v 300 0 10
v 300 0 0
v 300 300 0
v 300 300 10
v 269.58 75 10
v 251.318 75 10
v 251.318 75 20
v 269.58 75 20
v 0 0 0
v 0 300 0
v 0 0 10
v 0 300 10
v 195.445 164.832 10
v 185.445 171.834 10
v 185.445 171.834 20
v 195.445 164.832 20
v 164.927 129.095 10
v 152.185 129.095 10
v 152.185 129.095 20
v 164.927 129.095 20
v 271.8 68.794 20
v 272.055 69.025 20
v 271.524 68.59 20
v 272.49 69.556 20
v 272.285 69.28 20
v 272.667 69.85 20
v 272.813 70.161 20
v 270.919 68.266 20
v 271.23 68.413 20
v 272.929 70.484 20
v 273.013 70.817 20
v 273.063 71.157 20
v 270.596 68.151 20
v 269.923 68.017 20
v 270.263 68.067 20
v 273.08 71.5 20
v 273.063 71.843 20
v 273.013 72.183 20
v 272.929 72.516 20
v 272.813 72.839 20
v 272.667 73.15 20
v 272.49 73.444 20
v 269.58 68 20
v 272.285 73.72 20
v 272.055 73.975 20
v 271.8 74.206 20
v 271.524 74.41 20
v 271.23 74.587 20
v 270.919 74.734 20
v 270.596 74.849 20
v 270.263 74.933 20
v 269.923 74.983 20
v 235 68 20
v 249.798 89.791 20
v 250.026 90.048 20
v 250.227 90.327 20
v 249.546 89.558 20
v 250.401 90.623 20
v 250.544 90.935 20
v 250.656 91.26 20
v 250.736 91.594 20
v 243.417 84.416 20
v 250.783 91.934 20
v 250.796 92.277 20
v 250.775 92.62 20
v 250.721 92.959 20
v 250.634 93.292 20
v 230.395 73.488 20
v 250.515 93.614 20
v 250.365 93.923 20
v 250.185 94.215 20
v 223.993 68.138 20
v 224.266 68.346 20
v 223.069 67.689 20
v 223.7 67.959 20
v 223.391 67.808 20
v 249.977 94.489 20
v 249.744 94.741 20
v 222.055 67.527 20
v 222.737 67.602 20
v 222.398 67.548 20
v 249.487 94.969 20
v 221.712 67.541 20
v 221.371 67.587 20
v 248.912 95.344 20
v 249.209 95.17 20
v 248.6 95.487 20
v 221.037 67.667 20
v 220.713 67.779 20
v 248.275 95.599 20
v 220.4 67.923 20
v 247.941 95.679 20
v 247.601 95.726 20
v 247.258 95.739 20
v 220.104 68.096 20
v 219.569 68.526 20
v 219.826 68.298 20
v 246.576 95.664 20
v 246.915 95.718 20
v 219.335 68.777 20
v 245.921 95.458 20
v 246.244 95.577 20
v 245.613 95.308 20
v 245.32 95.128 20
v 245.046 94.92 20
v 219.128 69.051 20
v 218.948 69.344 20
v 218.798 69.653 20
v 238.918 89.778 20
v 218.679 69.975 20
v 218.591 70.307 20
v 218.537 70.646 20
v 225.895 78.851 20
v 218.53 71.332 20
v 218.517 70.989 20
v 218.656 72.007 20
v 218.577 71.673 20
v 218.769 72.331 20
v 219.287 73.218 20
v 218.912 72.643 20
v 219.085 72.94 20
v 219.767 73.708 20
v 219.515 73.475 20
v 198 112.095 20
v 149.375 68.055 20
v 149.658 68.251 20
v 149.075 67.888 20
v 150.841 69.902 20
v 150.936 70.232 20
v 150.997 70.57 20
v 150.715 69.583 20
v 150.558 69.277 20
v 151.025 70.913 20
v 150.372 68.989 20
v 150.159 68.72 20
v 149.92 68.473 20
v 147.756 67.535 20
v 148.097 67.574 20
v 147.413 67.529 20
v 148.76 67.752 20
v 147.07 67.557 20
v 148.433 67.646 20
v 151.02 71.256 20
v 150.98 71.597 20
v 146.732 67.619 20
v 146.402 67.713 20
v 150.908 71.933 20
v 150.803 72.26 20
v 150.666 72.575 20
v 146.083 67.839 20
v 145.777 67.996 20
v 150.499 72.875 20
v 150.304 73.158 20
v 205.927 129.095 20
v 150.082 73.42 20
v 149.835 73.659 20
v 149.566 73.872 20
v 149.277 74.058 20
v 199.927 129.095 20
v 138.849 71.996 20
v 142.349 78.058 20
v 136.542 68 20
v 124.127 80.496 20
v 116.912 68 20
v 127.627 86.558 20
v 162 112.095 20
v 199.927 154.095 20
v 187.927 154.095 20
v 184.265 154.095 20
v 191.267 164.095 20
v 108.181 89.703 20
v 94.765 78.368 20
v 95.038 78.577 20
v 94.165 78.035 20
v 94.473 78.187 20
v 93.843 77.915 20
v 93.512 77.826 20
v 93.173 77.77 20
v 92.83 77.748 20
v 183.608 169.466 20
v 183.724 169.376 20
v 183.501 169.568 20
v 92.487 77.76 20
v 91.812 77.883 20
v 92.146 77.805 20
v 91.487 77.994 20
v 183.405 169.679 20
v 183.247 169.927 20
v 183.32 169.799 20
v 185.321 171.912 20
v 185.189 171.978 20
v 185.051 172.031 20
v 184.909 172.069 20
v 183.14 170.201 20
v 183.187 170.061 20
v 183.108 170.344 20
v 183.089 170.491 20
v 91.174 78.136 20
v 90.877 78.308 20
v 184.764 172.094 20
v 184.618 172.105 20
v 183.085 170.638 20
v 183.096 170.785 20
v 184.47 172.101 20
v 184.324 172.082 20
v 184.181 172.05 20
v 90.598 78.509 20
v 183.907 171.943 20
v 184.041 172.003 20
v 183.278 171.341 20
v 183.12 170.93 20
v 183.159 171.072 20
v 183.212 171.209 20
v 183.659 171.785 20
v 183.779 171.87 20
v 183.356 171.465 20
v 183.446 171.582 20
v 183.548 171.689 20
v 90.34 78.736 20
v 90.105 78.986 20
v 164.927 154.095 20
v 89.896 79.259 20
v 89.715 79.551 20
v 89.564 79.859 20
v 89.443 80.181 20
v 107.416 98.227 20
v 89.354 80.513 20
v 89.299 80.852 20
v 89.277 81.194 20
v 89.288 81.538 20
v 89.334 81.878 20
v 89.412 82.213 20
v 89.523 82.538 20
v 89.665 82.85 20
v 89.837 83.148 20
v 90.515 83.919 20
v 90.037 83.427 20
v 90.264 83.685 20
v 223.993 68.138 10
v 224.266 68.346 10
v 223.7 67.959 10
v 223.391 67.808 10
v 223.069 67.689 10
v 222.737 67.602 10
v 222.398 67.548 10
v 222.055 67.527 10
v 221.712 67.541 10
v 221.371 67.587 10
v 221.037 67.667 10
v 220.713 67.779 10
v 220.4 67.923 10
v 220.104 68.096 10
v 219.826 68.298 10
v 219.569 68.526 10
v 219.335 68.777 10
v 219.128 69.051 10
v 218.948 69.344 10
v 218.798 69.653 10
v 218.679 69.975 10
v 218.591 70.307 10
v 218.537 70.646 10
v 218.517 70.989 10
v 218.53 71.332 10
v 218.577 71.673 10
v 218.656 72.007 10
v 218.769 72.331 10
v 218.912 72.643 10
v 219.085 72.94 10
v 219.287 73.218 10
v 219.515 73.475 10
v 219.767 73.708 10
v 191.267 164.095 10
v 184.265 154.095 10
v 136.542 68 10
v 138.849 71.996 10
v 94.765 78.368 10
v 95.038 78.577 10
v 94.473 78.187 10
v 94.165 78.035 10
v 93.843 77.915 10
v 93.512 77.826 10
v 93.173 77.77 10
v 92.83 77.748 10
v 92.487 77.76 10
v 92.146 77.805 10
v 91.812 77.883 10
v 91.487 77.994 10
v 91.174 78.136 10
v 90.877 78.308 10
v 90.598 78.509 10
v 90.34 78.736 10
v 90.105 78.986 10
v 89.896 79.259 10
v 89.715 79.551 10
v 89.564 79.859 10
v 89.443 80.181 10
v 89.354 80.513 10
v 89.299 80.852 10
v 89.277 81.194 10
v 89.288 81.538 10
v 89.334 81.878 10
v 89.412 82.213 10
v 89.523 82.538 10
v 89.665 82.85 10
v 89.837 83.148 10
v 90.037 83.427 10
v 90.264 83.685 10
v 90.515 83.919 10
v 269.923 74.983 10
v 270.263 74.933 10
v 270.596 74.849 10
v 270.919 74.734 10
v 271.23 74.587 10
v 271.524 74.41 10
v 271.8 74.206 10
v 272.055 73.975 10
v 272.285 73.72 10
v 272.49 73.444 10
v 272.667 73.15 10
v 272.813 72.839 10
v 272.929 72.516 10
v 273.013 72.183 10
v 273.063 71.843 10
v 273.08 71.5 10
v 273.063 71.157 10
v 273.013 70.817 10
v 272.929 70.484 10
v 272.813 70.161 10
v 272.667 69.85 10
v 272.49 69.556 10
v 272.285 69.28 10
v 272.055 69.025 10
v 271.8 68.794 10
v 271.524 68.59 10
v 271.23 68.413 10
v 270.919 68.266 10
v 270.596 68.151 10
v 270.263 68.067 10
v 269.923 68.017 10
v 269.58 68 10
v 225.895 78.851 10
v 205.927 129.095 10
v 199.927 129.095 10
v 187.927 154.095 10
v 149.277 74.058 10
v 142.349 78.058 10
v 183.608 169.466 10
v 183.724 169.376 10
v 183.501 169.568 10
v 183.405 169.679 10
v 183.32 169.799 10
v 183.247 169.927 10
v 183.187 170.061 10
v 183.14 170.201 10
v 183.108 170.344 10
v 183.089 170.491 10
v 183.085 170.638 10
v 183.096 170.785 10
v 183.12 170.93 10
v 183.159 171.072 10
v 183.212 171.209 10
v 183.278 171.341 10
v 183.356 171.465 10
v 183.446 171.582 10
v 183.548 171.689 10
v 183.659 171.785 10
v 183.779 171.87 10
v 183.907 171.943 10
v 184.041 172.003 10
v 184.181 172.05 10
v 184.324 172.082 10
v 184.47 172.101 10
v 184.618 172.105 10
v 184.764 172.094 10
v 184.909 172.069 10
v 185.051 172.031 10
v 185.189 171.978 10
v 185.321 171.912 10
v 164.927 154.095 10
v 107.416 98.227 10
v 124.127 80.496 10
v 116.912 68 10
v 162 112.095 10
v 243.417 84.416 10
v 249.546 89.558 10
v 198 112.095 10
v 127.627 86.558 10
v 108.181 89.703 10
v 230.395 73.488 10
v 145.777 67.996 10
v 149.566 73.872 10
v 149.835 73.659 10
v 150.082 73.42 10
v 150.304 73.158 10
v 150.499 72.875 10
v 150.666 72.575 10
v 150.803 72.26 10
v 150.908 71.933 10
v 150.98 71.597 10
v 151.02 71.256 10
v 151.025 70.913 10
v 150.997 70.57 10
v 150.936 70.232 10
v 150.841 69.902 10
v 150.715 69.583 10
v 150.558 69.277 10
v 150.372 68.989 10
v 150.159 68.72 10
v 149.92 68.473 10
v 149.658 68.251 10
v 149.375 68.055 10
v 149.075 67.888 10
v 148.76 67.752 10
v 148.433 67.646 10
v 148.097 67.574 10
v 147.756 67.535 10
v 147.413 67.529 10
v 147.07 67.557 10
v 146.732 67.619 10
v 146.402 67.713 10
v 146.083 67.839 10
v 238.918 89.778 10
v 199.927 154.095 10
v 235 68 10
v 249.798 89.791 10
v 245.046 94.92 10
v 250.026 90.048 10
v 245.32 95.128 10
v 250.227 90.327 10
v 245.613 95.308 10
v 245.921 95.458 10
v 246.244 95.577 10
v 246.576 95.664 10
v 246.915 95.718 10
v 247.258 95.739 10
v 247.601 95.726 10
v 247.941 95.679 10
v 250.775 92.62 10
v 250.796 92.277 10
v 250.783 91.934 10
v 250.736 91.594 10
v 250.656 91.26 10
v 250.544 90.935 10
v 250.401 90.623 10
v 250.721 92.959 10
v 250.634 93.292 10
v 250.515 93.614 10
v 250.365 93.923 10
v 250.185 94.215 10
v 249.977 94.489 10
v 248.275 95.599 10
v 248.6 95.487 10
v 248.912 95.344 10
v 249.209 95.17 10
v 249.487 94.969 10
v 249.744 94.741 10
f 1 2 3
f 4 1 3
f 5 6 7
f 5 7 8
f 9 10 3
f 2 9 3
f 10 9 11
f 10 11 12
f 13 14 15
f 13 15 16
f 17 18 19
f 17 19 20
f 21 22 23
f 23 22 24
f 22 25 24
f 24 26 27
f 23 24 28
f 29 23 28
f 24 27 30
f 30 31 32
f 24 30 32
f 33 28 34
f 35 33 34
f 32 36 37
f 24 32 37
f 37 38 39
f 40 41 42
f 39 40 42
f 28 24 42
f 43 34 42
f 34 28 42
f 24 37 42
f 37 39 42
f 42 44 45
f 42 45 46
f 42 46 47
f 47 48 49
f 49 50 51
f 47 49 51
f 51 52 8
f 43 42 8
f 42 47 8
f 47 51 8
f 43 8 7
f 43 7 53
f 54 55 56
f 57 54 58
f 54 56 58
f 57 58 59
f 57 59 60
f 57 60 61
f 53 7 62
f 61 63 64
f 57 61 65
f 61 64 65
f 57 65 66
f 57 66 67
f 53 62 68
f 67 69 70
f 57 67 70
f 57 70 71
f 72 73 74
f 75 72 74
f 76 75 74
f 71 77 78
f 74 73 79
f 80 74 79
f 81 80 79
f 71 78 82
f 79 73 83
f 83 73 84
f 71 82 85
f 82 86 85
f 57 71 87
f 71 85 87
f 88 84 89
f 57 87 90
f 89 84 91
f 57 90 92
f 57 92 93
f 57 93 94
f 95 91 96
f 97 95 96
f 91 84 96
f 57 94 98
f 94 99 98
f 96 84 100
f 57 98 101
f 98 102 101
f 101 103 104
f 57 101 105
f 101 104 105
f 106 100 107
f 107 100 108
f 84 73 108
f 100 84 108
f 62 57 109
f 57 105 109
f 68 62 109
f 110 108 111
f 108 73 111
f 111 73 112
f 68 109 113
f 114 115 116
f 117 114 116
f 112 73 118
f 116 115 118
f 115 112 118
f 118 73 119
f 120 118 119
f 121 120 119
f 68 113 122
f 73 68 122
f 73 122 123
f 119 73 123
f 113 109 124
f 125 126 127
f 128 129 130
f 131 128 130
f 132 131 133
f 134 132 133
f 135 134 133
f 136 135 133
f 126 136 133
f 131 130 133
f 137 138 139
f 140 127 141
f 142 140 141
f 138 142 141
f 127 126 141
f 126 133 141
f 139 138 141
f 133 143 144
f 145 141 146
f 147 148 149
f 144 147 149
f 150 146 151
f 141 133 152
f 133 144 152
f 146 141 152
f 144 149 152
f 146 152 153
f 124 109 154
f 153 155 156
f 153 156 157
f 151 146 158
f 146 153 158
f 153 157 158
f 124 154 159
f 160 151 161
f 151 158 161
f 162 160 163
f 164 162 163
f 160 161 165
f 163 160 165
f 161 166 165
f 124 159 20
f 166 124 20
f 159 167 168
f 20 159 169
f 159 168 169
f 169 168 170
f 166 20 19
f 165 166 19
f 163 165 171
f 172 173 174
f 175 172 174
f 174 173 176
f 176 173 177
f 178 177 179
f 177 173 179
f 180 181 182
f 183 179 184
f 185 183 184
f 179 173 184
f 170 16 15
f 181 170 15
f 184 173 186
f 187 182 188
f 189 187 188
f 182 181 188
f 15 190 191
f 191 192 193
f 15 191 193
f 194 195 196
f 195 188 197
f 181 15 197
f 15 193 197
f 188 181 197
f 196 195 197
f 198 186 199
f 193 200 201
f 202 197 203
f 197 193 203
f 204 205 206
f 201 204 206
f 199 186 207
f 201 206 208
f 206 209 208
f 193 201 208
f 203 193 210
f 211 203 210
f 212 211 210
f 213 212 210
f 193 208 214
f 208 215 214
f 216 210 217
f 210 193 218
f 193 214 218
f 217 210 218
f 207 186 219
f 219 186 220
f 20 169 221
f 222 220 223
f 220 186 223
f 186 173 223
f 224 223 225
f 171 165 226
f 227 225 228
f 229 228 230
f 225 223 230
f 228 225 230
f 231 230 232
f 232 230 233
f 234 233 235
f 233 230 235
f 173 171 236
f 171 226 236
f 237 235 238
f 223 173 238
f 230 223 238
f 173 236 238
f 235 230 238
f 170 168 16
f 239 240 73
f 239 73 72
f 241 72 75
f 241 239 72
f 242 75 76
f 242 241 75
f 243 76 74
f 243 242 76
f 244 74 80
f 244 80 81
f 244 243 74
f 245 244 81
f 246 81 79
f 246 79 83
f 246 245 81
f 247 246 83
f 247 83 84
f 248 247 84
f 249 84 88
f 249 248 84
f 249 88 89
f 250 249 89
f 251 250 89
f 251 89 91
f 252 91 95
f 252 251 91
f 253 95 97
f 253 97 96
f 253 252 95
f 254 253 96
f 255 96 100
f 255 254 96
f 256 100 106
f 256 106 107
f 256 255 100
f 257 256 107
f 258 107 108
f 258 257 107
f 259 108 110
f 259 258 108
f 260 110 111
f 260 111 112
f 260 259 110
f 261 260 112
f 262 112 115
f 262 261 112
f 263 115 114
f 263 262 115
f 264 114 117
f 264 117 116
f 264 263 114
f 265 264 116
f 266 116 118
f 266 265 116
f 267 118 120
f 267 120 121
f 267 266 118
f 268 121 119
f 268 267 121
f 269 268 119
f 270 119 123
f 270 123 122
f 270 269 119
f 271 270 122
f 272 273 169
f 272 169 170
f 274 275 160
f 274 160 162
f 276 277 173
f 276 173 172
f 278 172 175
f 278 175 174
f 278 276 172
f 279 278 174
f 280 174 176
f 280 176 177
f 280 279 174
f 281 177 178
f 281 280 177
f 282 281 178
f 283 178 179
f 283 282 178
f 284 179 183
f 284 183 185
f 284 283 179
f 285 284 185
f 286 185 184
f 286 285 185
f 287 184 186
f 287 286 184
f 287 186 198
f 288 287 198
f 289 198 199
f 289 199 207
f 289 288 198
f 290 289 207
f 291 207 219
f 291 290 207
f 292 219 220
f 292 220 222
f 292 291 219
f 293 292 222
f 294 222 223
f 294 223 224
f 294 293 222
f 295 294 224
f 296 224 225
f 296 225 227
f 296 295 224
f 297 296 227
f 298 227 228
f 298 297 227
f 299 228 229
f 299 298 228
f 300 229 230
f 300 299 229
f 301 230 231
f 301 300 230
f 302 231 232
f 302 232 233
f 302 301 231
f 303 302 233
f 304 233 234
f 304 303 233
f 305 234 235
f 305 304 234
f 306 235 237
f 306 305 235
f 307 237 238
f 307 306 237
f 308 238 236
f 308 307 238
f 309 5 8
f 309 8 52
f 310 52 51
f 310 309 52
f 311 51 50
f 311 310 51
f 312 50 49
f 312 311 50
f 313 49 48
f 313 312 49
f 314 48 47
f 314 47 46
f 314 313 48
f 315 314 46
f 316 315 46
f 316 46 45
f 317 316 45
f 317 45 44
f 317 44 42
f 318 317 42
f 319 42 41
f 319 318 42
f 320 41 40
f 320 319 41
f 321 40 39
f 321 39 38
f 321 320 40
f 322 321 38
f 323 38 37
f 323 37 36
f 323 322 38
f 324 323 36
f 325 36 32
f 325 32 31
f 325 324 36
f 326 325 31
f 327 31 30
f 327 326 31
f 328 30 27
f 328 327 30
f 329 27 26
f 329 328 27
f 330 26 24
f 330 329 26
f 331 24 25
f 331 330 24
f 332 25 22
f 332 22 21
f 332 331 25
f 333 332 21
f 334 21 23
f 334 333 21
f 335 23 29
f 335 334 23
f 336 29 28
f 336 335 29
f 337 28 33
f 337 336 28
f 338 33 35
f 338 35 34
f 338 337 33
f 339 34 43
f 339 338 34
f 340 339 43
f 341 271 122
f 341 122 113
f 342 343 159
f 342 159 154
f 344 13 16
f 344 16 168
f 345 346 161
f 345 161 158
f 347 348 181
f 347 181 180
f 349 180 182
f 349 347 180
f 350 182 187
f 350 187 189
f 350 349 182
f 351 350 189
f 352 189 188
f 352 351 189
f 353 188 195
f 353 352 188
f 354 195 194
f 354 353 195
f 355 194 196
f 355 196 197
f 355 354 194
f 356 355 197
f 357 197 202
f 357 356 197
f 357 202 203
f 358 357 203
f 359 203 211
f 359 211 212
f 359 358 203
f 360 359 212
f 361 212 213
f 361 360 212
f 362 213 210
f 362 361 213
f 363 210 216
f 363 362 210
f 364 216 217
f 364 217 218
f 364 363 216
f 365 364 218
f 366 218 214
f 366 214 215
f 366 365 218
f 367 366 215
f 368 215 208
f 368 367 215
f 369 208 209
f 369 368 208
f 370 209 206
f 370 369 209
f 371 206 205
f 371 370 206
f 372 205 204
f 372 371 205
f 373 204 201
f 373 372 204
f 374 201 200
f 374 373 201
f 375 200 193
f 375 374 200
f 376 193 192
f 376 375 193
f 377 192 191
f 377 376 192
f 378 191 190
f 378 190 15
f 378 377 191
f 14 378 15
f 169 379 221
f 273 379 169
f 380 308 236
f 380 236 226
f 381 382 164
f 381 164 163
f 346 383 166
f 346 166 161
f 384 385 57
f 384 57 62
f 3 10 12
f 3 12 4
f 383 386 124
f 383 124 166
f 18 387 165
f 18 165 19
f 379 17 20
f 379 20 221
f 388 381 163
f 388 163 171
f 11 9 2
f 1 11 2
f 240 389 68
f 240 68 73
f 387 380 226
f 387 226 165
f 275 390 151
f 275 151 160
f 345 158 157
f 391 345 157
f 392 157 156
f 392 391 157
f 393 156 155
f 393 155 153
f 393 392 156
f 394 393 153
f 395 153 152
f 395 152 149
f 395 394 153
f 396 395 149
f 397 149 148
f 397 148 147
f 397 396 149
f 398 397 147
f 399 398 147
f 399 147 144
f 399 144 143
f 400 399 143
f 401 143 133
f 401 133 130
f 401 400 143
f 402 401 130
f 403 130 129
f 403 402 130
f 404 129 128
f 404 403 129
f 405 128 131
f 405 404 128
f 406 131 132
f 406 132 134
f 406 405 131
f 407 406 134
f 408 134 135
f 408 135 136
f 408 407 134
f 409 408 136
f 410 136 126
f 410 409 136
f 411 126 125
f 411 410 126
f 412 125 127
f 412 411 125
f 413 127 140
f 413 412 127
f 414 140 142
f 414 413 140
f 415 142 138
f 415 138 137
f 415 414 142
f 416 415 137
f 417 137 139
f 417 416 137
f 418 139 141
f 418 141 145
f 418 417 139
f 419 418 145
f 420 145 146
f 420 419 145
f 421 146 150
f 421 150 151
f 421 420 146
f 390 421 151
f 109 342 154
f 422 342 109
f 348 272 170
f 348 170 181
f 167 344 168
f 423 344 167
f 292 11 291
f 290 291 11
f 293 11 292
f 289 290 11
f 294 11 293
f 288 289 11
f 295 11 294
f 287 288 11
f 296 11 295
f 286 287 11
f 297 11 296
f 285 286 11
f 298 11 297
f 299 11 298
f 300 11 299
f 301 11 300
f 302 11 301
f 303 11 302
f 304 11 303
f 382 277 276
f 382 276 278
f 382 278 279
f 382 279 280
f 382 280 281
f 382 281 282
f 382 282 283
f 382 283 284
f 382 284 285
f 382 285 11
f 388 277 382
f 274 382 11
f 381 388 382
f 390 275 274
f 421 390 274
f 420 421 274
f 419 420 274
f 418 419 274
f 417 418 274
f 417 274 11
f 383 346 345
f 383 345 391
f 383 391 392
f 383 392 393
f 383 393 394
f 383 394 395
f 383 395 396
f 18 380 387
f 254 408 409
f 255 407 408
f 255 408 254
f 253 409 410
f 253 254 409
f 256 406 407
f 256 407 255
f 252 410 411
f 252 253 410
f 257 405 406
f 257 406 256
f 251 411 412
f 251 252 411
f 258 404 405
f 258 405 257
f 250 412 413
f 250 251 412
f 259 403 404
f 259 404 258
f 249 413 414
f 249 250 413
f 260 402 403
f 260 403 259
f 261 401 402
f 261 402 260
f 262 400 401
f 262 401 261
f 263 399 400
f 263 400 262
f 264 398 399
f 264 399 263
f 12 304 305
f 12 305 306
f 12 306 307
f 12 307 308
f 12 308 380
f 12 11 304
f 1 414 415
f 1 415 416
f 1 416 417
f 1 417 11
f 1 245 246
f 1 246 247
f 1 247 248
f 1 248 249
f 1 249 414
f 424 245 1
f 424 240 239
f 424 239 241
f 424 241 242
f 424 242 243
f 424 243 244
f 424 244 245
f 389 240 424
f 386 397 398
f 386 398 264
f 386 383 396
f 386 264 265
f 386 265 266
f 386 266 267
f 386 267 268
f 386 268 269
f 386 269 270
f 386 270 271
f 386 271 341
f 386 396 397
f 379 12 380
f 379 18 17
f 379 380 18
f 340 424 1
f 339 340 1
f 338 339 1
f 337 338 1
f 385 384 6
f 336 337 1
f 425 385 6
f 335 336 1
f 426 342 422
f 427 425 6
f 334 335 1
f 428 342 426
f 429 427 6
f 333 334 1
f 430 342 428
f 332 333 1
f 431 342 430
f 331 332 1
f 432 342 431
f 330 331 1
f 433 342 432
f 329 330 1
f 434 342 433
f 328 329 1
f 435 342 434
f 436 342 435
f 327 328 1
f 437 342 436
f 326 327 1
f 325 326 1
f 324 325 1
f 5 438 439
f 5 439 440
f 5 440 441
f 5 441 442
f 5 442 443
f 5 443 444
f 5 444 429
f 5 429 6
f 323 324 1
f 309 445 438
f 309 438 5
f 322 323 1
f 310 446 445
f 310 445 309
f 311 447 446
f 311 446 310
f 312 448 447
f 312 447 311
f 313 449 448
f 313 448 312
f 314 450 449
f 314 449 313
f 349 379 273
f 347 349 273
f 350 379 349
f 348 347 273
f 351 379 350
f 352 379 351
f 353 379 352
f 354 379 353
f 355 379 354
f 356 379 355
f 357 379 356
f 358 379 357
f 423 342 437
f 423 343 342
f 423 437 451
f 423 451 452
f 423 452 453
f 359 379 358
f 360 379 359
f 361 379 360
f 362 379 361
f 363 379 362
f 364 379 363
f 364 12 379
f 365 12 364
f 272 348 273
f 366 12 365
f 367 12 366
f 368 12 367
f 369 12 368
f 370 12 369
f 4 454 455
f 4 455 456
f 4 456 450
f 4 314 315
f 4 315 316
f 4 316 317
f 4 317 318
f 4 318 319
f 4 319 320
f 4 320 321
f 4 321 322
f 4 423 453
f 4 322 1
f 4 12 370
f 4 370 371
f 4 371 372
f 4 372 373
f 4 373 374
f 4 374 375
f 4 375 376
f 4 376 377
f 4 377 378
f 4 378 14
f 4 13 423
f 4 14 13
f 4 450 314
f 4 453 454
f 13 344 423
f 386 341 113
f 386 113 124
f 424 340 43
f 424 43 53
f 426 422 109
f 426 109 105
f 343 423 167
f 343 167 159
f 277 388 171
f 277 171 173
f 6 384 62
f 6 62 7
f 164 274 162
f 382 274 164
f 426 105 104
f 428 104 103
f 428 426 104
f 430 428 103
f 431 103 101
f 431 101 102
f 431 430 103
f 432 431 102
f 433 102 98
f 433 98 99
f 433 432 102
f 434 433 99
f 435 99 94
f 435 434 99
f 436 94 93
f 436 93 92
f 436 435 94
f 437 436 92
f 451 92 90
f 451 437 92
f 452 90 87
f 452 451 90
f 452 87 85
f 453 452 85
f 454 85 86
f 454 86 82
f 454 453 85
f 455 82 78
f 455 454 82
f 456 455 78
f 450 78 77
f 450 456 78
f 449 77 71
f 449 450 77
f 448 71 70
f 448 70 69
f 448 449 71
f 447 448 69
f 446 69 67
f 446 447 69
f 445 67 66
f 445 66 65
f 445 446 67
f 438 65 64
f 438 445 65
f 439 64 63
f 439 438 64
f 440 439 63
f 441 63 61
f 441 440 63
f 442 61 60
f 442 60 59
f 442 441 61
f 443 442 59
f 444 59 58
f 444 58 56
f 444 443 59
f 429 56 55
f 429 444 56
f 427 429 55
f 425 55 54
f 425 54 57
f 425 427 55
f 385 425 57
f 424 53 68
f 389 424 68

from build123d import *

# Parameters (mm, degrees)
SKICA1_W                = 300
SKICA1_H                = 300
P_IDAT_VYSUNUT_M1_DEPTH = 10
P_IDAT_VYSUNUT_M3_DEPTH = 10


with BuildPart() as part:
    # Skica1 → Přidat vysunutím1 (new body)
    with BuildSketch(Plane.XY):
        with Locations((150, 150)):
            Rectangle(SKICA1_W, SKICA1_H)
    extrude(amount=P_IDAT_VYSUNUT_M1_DEPTH)

    # Skica3 → Přidat vysunutím3 (add)
    with BuildSketch(Plane.XY.offset(10)):
        with BuildLine():
            Line((116.91189832, 68), (124.126552838, 80.496148184))
            Line((124.126552838, 80.496148184), (108.180545378, 89.702579884))
            Line((108.180545378, 89.702579884), (95.03783106, 78.576572328))
            ThreePointArc((95.03783106, 78.576572328), (90.105085693, 78.986478585), (90.514991949, 83.919223952))
            Line((90.514991949, 83.919223952), (107.416046941, 98.226867031))
            Line((107.416046941, 98.226867031), (127.626552838, 86.55832601))
            Line((127.626552838, 86.55832601), (152.185045424, 129.094882926))
            Line((152.185045424, 129.094882926), (164.927230189, 129.094882926))
            Line((164.927230189, 129.094882926), (164.927230189, 154.094882926))
            Line((164.927230189, 154.094882926), (184.264906422, 154.094882926))
            Line((184.264906422, 154.094882926), (191.266981804, 164.094882926))
            Line((191.266981804, 164.094882926), (183.724437937, 169.376228999))
            ThreePointArc((183.724437937, 169.376228999), (183.356074525, 171.46532172), (185.445167246, 171.833685132))
            Line((185.445167246, 171.833685132), (195.445167246, 164.83160975))
            Line((195.445167246, 164.83160975), (187.927230189, 154.094882926))
            Line((187.927230189, 154.094882926), (199.927230189, 154.094882926))
            Line((199.927230189, 154.094882926), (199.927230189, 129.094882926))
            Line((199.927230189, 129.094882926), (205.927230189, 129.094882926))
            Line((205.927230189, 129.094882926), (238.917942598, 89.77808289))
            Line((238.917942598, 89.77808289), (245.046298143, 94.920383768))
            ThreePointArc((245.046298143, 94.920383768), (249.977210328, 94.488984851), (249.54581141, 89.558072666))
            Line((249.54581141, 89.558072666), (243.417455866, 84.415771788))
            Line((243.417455866, 84.415771788), (251.3182265, 75))
            Line((251.3182265, 75), (269.579798581, 75))
            ThreePointArc((269.579798581, 75), (273.079798581, 71.5), (269.579798581, 68))
            Line((269.579798581, 68), (235, 68))
            Line((235, 68), (230.394700333, 73.488382424))
            Line((230.394700333, 73.488382424), (224.266344788, 68.346081546))
            ThreePointArc((224.266344788, 68.346081546), (219.335432603, 68.777480463), (219.76683152, 73.708392648))
            Line((219.76683152, 73.708392648), (225.895187065, 78.850693526))
            Line((225.895187065, 78.850693526), (198, 112.094882926))
            Line((198, 112.094882926), (162, 112.094882926))
            Line((162, 112.094882926), (142.348984702, 78.05832601))
            Line((142.348984702, 78.05832601), (149.277187933, 74.05832601))
            ThreePointArc((149.277187933, 74.05832601), (150.558276846, 69.277237097), (145.777187933, 67.996148184))
            Line((145.777187933, 67.996148184), (138.848984702, 71.996148184))
            Line((138.848984702, 71.996148184), (136.541807473, 68))
            Line((136.541807473, 68), (116.91189832, 68))
        make_face()
    extrude(amount=P_IDAT_VYSUNUT_M3_DEPTH)


solid = part.part
